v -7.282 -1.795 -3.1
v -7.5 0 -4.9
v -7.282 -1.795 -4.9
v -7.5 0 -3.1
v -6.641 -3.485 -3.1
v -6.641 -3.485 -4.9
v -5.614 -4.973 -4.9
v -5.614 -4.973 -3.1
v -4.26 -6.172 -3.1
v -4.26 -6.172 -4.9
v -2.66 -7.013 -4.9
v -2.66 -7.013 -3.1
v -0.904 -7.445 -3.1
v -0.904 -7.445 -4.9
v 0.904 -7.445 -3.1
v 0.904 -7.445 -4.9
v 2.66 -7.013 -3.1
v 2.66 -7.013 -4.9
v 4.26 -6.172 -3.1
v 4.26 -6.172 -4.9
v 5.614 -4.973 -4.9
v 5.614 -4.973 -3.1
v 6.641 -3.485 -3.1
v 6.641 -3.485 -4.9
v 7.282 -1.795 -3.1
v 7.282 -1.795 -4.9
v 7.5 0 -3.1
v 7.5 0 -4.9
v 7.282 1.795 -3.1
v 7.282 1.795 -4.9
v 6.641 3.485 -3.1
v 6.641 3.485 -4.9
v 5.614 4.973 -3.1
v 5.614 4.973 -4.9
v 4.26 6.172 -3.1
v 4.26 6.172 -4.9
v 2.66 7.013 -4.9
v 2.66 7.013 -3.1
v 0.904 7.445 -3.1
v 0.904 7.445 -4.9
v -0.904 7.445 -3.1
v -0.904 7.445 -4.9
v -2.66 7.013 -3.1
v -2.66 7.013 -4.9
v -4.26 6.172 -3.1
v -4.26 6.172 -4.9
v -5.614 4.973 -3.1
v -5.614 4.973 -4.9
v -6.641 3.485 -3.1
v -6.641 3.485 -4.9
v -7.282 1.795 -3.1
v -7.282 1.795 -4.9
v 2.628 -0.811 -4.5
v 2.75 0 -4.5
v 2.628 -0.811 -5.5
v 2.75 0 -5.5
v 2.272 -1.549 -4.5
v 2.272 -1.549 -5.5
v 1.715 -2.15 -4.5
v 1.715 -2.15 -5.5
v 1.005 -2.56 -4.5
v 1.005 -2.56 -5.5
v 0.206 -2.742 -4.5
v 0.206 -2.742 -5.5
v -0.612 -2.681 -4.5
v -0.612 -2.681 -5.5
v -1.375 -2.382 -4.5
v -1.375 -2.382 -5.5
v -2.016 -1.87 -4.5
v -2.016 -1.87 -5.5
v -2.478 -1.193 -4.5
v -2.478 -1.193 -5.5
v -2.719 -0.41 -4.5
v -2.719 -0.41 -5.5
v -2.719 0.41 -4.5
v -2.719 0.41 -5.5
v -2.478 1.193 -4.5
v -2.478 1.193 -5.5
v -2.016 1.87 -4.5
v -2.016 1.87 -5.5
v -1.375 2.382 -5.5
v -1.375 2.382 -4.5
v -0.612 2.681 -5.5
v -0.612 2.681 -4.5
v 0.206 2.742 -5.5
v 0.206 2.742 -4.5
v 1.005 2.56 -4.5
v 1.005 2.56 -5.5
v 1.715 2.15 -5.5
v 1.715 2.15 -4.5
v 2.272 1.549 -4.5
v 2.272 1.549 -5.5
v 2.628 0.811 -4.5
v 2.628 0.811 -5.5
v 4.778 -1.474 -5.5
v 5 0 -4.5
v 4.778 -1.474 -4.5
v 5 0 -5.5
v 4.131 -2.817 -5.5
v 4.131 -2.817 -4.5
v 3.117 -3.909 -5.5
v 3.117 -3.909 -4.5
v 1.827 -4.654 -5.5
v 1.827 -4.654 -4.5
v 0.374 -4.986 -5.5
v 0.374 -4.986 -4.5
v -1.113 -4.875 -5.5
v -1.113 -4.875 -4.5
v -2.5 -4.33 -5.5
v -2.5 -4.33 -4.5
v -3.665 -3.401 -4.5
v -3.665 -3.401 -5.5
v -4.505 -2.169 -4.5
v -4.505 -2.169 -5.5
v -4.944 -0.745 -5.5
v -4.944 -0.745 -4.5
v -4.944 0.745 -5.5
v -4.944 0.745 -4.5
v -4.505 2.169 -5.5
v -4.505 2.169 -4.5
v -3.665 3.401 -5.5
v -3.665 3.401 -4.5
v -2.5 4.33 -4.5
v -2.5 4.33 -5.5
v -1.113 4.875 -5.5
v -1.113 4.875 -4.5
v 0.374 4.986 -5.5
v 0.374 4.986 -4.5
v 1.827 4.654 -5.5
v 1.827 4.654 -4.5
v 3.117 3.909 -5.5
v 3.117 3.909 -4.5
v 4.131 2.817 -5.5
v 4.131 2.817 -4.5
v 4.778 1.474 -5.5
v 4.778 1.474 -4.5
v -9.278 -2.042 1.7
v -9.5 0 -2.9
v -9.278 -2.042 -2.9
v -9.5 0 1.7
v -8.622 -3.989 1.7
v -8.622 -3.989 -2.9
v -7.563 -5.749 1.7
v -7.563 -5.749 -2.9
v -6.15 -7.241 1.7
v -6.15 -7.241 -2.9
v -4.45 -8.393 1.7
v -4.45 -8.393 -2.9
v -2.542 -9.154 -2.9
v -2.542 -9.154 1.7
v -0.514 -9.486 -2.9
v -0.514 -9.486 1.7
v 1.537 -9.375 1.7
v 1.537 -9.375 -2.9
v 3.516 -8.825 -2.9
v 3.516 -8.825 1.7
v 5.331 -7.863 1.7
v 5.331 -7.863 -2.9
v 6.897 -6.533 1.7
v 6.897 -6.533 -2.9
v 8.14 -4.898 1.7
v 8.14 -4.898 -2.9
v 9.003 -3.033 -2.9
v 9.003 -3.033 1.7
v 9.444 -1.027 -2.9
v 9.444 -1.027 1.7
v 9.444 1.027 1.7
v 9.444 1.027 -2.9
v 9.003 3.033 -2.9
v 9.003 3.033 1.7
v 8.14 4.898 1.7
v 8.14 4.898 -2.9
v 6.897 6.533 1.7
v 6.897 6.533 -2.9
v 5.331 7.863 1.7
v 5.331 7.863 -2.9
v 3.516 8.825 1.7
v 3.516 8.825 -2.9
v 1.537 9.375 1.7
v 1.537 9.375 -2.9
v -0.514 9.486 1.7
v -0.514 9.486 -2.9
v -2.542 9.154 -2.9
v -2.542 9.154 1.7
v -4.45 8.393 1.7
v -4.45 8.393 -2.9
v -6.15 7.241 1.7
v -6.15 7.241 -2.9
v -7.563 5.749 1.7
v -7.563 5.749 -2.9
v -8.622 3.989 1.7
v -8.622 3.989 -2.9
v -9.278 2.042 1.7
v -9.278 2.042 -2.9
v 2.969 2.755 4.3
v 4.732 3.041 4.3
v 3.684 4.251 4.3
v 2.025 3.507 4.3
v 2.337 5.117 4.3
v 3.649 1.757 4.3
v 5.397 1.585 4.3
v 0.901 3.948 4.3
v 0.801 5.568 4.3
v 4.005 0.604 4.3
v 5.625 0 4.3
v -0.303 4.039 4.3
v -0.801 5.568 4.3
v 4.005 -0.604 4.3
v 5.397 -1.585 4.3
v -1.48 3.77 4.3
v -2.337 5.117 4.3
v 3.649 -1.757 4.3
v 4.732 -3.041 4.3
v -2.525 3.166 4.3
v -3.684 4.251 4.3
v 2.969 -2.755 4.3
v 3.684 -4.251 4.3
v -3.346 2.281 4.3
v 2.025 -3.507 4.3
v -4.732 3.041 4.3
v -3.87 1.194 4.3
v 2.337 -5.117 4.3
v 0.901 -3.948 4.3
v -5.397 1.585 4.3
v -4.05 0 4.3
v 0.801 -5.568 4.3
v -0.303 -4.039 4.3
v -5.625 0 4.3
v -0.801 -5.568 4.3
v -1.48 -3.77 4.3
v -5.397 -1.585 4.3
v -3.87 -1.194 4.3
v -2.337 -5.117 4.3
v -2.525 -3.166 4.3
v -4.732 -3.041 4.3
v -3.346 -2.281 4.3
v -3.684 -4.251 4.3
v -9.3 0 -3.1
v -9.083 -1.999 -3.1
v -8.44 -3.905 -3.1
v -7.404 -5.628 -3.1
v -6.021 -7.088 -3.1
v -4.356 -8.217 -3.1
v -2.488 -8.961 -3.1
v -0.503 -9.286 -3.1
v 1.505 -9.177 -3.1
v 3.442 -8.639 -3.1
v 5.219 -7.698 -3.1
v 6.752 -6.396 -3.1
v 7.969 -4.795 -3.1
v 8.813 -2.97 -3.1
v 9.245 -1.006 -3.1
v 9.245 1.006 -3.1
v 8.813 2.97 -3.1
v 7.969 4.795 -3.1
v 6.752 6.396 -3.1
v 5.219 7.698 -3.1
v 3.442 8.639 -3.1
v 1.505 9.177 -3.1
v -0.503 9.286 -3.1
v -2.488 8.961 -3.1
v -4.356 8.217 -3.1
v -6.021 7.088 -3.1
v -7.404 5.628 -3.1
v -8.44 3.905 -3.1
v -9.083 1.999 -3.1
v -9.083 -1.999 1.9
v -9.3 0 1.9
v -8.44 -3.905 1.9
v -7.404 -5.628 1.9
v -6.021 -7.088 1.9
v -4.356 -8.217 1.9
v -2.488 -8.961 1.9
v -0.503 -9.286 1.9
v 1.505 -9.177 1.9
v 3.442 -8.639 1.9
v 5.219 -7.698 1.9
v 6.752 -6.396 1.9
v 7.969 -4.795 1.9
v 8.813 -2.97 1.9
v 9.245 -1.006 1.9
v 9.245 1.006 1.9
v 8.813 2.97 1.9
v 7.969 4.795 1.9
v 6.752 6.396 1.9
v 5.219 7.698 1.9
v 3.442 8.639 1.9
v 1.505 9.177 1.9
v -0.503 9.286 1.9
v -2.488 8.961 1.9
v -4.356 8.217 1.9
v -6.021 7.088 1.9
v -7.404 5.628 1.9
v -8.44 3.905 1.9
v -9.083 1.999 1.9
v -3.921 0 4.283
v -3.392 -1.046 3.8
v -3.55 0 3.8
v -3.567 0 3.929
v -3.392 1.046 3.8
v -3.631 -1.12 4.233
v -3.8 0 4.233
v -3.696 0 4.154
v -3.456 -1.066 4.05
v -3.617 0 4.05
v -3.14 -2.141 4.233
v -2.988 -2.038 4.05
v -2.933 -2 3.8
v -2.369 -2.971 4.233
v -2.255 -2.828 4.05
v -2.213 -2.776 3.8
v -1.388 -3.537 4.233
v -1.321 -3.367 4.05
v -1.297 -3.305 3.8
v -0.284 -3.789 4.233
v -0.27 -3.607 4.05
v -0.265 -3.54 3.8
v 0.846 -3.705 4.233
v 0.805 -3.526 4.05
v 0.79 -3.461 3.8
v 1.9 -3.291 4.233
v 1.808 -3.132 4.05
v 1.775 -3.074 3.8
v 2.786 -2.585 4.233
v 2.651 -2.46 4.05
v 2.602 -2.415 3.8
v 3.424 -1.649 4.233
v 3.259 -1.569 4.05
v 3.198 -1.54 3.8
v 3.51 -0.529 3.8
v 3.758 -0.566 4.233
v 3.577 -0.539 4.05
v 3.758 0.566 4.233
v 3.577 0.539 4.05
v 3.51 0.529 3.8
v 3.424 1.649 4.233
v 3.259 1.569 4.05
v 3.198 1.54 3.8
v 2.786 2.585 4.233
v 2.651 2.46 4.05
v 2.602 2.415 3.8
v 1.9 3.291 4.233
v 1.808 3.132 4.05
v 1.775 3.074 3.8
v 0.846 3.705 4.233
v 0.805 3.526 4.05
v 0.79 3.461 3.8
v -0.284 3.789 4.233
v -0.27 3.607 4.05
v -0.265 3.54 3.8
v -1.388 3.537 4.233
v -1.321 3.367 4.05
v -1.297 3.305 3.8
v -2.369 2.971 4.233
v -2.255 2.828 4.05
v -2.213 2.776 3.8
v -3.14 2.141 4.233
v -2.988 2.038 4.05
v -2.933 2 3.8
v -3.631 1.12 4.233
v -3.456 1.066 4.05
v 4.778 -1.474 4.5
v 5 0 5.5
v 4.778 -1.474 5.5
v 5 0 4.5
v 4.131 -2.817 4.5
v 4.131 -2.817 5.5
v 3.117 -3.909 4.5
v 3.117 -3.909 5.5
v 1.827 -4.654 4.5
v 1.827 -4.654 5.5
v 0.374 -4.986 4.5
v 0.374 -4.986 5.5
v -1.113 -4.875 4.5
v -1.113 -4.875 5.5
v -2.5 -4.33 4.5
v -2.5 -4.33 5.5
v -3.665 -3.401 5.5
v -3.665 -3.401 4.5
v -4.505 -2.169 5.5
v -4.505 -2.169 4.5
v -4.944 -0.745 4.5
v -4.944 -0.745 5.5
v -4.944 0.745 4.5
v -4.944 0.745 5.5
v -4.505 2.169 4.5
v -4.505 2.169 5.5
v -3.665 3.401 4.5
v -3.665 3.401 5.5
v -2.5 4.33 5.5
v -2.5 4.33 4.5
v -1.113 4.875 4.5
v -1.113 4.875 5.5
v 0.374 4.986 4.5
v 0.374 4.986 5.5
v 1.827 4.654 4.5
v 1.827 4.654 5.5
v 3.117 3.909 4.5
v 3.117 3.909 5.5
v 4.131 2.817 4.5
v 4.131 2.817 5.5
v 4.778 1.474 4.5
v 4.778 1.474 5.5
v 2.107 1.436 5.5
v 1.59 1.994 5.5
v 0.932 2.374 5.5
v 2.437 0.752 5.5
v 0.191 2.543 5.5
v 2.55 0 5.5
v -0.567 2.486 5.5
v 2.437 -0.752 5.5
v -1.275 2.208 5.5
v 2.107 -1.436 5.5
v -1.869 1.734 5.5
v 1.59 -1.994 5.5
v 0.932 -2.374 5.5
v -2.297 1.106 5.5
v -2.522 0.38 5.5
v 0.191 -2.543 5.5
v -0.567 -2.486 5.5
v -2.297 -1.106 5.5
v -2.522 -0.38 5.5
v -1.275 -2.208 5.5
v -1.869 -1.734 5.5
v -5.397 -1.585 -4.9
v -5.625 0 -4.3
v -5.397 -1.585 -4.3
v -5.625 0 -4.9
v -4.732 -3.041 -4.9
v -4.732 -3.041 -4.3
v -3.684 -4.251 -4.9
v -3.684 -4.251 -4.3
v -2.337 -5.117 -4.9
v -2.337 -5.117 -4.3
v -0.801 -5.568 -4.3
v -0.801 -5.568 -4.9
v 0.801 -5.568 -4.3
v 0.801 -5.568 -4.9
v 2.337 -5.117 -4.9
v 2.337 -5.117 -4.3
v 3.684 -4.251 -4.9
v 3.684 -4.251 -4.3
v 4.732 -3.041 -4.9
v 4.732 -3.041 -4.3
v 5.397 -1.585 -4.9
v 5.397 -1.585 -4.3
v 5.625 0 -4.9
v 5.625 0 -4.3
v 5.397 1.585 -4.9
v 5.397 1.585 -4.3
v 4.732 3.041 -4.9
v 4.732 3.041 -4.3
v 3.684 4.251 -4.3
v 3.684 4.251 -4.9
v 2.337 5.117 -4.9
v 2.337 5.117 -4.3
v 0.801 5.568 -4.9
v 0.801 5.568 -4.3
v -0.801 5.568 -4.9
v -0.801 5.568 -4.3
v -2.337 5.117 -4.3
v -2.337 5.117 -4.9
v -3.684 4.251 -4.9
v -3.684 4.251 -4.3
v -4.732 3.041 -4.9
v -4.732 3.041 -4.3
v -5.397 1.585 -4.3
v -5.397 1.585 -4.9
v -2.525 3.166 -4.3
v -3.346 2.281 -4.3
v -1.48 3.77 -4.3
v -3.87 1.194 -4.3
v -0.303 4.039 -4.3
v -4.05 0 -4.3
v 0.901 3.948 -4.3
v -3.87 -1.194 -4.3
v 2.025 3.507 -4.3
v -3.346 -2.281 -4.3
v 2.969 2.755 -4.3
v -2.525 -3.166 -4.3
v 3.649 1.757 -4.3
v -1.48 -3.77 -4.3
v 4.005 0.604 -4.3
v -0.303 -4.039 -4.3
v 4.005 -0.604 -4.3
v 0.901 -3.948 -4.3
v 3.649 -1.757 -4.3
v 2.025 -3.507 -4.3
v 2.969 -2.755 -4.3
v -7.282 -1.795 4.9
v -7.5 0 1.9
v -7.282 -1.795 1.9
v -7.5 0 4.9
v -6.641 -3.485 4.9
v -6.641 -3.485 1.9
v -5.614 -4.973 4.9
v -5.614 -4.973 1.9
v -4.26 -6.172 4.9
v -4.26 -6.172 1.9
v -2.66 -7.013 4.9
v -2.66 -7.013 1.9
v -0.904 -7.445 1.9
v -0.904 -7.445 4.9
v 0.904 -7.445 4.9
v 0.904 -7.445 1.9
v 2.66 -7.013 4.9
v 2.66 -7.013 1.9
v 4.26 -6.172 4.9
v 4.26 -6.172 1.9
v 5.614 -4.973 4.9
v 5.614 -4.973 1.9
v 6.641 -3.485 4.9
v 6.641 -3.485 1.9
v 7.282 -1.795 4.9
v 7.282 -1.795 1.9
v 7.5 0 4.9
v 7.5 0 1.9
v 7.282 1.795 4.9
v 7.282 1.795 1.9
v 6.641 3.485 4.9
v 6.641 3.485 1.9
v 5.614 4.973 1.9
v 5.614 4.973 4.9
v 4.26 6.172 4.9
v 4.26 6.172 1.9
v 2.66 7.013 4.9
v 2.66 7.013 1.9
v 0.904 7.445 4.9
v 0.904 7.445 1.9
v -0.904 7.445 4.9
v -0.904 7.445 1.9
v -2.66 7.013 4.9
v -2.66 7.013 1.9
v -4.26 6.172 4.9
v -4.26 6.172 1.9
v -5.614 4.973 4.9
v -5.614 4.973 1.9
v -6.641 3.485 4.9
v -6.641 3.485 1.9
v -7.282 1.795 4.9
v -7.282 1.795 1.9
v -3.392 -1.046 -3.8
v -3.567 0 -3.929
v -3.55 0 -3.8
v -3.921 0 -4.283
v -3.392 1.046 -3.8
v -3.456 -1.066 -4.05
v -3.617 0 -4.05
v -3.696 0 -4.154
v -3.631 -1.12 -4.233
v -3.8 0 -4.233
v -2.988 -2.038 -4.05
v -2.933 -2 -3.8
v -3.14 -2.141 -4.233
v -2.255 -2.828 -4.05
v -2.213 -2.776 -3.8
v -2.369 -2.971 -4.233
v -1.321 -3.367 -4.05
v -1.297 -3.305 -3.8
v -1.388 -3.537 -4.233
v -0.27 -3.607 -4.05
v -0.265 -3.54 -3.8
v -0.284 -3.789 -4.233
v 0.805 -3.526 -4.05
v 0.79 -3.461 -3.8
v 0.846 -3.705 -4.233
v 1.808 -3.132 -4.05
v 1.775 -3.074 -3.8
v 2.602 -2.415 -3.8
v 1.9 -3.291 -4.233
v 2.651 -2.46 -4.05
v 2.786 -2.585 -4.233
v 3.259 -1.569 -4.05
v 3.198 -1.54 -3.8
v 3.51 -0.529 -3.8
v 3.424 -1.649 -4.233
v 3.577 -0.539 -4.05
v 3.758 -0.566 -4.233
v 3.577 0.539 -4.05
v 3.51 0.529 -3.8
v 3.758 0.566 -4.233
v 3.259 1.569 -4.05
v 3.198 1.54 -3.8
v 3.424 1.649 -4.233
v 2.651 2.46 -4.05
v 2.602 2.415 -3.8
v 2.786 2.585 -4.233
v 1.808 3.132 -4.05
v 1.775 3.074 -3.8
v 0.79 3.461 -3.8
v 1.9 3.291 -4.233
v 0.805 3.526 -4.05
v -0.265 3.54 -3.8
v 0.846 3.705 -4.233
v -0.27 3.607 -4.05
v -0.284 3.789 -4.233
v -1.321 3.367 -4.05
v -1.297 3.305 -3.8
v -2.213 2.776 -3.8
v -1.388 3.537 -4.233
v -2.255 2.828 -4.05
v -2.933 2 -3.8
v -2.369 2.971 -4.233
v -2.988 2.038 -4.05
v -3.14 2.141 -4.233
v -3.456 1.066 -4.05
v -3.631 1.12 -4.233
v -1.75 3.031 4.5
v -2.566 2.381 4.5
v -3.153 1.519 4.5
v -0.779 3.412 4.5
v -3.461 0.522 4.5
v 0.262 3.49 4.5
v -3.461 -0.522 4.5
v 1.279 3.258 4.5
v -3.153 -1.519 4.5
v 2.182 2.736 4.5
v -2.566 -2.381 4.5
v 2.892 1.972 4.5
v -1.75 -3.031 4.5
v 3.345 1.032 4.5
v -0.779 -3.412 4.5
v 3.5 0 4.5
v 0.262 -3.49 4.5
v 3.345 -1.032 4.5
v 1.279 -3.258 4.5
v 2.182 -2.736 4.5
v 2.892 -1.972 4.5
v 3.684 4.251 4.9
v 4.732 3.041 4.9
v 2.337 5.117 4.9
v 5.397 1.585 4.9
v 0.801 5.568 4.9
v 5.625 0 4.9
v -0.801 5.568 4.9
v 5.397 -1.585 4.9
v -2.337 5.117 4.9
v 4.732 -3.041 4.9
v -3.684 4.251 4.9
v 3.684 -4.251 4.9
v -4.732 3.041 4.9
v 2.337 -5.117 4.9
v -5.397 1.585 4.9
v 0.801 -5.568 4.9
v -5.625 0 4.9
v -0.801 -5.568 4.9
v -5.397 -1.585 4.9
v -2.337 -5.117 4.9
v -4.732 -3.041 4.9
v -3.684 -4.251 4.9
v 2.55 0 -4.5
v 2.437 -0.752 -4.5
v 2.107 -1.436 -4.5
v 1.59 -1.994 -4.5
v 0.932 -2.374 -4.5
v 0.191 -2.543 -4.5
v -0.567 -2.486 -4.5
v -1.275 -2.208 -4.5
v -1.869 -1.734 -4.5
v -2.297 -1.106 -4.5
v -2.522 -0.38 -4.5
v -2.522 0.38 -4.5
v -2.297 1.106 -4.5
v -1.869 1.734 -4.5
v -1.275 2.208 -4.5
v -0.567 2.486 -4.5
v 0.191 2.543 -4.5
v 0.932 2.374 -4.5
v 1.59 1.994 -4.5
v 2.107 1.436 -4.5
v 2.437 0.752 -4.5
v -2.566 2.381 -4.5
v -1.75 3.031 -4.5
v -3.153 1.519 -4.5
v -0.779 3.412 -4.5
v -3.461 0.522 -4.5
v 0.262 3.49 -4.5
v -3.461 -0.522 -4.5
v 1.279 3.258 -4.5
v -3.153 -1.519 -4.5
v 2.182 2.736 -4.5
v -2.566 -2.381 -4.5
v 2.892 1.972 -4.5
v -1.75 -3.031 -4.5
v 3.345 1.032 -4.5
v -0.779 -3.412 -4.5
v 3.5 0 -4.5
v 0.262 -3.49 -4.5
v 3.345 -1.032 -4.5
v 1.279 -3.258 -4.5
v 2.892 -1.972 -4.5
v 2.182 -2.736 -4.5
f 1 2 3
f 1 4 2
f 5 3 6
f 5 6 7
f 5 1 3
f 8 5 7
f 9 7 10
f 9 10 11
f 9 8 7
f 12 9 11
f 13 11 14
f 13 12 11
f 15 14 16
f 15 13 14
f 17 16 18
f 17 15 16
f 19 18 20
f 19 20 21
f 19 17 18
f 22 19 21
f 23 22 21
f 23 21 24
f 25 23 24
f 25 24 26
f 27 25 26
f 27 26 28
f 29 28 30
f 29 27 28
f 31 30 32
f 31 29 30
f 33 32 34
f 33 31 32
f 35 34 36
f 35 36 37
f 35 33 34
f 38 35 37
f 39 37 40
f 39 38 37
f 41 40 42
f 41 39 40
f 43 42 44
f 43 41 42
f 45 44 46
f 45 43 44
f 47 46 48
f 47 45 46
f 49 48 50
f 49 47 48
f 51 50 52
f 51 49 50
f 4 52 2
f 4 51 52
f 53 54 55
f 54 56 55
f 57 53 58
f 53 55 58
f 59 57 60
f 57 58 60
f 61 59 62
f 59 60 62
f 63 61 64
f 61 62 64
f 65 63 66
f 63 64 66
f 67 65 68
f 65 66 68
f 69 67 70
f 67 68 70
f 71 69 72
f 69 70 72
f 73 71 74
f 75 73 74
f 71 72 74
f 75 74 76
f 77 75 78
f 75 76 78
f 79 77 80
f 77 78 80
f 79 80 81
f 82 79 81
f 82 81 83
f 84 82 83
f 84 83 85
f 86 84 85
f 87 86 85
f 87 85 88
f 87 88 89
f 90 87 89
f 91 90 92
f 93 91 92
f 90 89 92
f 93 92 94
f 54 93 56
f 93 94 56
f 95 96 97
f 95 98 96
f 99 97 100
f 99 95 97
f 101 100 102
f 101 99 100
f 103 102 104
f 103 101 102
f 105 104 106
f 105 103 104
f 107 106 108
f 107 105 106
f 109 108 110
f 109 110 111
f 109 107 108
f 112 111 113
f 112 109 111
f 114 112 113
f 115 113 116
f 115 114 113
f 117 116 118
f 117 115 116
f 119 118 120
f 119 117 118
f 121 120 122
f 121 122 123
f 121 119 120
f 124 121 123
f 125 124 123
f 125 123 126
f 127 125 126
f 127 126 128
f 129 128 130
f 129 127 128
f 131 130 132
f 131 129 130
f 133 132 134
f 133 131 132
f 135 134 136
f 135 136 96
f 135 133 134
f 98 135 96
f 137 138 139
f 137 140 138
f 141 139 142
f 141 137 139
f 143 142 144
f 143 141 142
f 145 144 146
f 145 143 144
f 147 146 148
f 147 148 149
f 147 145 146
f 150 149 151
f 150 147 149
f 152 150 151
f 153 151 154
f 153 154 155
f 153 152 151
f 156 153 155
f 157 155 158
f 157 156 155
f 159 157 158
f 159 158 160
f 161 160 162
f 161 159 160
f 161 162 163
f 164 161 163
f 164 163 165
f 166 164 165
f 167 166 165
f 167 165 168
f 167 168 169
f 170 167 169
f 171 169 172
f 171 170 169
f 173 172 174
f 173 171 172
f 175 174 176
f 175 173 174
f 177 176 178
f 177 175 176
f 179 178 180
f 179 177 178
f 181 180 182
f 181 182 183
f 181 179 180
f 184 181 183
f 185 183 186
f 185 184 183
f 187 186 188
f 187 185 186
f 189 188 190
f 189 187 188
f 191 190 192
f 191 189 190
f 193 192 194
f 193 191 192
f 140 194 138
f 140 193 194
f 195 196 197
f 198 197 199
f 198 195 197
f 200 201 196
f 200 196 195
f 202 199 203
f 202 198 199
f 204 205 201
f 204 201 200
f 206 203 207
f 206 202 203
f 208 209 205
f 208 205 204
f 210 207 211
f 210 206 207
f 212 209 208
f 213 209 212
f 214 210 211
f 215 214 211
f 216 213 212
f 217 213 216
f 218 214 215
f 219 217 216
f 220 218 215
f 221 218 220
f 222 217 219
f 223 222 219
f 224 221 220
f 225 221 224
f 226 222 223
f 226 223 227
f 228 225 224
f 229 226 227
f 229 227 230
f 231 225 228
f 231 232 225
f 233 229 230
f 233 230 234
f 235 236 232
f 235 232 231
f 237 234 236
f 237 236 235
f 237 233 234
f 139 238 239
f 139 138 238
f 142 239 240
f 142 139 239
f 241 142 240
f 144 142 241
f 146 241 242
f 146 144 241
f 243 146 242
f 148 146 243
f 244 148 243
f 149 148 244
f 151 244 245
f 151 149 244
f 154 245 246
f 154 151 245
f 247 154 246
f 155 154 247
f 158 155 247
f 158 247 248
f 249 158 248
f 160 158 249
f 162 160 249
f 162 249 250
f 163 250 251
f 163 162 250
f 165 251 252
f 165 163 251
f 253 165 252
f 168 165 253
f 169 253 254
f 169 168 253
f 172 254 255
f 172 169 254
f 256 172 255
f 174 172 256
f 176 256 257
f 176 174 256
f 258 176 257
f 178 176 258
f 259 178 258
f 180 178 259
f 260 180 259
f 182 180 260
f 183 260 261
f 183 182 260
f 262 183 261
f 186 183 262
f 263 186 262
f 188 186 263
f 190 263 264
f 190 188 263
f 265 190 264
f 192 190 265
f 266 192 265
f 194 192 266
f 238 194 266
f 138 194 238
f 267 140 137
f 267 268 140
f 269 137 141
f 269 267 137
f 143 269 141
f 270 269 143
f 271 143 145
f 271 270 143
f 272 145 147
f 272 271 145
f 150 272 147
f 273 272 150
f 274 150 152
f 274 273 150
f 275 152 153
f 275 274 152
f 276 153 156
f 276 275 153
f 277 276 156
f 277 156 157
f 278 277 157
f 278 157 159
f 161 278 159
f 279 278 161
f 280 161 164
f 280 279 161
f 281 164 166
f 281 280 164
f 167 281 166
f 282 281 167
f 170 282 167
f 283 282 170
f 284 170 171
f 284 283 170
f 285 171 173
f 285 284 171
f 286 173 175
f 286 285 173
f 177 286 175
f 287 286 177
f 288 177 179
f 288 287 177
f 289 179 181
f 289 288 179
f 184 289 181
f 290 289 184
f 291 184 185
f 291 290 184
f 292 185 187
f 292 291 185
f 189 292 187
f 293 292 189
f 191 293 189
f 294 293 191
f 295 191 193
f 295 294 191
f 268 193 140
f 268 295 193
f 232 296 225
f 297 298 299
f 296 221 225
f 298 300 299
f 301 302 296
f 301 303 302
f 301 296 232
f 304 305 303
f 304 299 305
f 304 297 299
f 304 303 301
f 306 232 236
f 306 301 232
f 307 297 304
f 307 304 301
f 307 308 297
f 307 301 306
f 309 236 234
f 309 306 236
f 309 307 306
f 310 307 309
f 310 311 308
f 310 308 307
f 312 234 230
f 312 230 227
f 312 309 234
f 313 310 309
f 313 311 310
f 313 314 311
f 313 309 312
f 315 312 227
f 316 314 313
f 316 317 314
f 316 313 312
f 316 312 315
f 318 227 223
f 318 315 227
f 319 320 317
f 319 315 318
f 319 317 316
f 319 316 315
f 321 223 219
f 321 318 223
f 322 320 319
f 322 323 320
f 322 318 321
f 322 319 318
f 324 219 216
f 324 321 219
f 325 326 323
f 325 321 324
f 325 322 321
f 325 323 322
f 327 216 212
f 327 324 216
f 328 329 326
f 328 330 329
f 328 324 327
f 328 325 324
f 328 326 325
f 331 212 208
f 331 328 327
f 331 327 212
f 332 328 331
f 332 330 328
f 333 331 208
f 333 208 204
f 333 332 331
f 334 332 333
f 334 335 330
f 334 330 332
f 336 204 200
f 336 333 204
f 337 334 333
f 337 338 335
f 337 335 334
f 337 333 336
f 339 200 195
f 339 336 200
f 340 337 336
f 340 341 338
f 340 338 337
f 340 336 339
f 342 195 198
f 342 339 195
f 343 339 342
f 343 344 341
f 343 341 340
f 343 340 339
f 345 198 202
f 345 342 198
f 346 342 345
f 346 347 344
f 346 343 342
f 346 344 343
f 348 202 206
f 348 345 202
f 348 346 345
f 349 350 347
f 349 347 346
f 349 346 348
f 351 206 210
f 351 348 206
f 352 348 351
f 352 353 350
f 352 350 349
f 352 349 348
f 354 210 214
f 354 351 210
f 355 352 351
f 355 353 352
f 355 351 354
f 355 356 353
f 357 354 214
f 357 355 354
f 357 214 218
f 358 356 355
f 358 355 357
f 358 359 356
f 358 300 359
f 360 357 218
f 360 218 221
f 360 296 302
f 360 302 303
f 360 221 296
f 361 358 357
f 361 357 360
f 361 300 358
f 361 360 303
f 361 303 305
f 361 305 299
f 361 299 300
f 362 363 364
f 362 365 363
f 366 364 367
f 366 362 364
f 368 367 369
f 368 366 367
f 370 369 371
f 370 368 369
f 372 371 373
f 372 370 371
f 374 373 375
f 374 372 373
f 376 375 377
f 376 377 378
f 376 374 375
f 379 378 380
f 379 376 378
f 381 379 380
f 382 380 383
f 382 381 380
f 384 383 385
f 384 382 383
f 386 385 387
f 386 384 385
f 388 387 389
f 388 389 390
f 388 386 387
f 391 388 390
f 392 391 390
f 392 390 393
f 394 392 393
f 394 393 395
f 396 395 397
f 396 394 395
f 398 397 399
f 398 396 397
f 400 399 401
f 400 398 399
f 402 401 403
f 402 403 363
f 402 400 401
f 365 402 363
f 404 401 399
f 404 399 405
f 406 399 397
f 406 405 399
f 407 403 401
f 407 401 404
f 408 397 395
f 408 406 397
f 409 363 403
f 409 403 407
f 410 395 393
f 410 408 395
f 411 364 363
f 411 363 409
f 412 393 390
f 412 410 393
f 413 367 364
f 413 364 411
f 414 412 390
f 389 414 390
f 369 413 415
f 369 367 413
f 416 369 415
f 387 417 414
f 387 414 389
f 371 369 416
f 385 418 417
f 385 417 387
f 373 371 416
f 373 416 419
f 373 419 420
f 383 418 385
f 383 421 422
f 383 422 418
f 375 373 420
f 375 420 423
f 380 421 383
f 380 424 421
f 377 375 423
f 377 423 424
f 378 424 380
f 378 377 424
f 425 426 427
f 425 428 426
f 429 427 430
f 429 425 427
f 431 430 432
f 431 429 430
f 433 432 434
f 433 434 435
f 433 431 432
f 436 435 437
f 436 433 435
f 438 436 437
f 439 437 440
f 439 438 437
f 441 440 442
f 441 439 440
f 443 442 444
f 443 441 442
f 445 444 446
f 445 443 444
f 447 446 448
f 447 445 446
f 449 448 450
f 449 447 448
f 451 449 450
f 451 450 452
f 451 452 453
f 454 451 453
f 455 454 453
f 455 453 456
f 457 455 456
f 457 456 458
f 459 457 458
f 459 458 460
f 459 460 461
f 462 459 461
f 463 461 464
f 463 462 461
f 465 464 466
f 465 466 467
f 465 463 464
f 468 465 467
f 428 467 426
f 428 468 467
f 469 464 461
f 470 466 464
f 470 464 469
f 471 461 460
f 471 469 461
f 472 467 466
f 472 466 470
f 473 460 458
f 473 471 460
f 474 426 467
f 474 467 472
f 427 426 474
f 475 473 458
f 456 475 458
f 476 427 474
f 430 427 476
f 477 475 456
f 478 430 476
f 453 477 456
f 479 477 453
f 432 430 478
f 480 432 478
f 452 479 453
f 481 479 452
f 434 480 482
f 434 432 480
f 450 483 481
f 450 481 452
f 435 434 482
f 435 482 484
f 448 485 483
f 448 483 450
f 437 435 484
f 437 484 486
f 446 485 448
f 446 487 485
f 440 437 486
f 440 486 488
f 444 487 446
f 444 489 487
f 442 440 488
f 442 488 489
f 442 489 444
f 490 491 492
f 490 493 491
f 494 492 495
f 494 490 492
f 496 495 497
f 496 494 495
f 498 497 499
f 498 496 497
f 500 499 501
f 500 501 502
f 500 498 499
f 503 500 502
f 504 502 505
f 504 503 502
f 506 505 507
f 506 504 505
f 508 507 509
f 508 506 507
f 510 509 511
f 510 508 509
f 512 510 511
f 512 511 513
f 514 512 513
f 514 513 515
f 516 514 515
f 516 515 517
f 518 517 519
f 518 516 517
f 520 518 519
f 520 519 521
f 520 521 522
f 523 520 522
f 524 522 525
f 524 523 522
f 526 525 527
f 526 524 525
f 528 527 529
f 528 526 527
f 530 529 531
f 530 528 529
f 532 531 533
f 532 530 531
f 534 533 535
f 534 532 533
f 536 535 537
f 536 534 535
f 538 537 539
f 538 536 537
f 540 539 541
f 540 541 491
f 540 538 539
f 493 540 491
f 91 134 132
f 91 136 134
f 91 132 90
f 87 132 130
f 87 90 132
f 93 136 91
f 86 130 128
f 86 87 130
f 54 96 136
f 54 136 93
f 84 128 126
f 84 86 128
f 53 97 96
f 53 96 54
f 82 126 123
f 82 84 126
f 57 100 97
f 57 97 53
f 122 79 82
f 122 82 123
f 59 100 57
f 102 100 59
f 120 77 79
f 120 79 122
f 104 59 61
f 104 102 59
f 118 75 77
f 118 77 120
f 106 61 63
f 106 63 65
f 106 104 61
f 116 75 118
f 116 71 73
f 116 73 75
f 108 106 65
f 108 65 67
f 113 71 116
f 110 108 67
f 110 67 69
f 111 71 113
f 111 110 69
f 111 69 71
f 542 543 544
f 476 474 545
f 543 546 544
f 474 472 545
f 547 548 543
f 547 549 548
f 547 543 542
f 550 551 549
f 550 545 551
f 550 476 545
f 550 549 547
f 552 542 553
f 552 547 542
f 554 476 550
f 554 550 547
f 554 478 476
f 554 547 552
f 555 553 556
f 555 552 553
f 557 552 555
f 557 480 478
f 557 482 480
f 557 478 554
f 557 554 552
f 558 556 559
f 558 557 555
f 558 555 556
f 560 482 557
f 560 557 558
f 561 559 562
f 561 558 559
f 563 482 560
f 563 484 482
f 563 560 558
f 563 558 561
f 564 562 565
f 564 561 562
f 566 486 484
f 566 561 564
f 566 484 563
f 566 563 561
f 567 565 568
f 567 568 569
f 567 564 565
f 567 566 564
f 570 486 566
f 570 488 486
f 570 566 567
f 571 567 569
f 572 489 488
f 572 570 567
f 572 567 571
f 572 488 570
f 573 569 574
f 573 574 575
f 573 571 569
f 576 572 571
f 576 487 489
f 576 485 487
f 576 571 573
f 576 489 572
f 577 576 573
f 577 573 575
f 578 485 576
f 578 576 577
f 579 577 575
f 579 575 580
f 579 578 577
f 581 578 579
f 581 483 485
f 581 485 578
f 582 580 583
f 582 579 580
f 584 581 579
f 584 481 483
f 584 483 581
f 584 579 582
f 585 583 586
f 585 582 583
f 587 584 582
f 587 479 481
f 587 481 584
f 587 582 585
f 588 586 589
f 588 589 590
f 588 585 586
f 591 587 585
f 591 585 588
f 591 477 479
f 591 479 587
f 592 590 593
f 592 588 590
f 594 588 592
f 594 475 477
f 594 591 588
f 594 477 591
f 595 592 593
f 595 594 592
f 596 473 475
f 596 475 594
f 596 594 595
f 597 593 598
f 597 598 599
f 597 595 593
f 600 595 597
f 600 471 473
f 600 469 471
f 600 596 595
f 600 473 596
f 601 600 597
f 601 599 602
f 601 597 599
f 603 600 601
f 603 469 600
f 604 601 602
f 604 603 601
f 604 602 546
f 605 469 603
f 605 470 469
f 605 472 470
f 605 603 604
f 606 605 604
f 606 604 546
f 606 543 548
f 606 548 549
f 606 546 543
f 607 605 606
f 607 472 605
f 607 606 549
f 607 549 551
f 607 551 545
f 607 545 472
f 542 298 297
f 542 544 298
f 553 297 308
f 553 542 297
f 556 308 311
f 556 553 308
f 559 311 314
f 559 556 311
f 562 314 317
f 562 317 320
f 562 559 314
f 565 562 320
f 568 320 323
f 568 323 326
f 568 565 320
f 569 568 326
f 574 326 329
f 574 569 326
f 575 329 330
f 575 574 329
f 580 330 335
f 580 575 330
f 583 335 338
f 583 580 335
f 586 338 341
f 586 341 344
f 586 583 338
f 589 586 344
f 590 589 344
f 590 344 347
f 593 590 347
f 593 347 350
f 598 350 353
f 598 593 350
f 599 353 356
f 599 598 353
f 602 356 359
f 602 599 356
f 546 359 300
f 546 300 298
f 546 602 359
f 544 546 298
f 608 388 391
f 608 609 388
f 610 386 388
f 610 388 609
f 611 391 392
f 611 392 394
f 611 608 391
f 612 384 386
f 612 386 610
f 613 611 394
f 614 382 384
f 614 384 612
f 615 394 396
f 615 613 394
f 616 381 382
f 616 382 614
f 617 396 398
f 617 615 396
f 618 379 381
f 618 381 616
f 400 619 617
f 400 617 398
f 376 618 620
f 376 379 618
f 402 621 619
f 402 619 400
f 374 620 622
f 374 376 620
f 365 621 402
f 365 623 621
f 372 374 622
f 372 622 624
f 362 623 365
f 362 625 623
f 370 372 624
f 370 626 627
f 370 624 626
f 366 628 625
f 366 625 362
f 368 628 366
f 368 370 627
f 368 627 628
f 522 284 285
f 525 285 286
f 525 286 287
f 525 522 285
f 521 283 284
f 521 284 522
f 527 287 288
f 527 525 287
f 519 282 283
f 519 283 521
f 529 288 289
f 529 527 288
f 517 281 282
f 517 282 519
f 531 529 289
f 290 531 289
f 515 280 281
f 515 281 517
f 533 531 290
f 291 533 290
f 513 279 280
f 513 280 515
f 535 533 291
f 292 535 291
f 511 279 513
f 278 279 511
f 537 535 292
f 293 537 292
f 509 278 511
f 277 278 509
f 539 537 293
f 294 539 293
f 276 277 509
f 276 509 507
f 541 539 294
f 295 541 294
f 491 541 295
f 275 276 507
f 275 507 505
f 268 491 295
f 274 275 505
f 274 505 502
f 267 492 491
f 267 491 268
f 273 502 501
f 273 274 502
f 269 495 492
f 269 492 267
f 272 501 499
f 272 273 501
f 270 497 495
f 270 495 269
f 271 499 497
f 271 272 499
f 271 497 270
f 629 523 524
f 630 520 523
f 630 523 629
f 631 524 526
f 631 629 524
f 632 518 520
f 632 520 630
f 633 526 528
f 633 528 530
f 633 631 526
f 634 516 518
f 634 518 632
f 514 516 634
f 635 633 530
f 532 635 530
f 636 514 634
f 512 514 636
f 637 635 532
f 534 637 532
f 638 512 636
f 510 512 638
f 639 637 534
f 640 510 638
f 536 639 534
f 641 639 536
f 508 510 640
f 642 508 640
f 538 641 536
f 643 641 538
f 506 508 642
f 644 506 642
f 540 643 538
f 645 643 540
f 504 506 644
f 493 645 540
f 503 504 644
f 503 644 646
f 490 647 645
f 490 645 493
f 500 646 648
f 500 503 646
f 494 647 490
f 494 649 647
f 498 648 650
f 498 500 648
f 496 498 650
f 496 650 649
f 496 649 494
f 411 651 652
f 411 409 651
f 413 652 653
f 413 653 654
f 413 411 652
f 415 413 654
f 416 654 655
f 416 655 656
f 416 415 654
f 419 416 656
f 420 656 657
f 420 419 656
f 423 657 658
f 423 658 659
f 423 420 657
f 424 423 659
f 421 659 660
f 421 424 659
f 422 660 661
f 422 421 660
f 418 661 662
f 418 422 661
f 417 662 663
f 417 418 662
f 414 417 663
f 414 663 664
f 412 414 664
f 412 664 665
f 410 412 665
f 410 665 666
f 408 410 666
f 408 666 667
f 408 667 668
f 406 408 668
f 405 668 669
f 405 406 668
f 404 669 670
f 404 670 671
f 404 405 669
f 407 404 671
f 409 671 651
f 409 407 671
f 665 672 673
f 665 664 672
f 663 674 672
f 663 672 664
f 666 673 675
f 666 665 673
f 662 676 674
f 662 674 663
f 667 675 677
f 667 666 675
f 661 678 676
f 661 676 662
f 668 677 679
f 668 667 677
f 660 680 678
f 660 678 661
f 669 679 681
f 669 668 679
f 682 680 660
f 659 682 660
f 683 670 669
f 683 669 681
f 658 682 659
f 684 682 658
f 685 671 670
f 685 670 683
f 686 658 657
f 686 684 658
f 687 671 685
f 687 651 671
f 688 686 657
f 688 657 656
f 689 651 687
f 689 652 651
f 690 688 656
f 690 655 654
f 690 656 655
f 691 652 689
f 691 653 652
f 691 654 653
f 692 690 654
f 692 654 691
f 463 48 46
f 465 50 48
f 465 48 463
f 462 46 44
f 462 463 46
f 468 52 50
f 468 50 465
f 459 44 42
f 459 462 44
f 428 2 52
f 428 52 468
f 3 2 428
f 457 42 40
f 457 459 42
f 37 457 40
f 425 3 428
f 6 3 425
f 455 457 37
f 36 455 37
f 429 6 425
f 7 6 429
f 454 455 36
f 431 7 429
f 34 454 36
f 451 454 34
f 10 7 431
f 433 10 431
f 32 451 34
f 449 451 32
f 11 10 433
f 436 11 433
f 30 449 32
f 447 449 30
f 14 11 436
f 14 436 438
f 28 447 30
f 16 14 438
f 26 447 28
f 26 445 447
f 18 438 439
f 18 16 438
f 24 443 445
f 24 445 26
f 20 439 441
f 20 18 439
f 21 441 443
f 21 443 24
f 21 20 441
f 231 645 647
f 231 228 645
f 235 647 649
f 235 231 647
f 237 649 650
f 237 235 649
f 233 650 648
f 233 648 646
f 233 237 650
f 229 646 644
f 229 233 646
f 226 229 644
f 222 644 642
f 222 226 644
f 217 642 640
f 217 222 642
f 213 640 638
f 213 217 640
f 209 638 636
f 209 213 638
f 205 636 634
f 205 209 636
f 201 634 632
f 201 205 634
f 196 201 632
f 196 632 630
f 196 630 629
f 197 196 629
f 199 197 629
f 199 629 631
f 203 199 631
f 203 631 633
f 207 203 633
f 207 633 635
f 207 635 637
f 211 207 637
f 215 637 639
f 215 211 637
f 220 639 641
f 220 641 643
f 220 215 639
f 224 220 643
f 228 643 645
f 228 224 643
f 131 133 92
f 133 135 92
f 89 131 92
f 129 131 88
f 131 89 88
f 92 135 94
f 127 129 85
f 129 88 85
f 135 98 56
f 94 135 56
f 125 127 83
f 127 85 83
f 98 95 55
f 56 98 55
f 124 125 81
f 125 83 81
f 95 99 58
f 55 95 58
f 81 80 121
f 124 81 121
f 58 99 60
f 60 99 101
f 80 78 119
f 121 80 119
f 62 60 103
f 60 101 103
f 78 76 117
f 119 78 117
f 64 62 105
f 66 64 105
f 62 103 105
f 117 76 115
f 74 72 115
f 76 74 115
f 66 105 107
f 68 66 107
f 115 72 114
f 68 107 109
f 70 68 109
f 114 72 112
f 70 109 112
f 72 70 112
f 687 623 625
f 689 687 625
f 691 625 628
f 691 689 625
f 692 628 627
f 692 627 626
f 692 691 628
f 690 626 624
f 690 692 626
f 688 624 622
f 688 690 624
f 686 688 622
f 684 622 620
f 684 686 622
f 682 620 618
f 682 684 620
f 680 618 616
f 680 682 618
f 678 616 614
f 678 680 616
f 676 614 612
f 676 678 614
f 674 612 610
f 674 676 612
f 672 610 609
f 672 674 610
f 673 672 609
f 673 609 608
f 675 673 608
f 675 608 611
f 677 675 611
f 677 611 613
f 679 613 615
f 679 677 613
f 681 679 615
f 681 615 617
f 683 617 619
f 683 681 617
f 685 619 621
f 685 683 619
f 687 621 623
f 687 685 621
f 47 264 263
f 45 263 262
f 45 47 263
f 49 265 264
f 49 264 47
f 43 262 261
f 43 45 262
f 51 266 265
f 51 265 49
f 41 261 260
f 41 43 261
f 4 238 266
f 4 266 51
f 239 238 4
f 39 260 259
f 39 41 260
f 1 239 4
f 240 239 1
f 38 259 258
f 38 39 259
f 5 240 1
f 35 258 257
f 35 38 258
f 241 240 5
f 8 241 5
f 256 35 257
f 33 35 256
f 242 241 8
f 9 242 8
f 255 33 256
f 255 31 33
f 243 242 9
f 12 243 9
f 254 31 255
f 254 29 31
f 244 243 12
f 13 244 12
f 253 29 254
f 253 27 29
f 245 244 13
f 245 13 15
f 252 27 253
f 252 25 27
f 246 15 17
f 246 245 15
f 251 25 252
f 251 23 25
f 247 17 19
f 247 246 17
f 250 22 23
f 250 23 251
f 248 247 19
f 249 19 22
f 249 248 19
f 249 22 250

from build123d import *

# Parameters (mm, degrees)
SKETCH3_W = 1
SKETCH3_H = 2.25


with BuildPart() as part:
    # Sketch1 → Revolve1 (revolve)
    with BuildSketch(Plane(origin=(0, 0, 0), x_dir=(0, 0, -1), z_dir=(1, 0, 0)), mode=Mode.PRIVATE) as revolve1_sk:
        with BuildLine():
            Line((-3.8, 3.55), (3.8, 3.55))
            ThreePointArc((3.8, 3.55), (4.153553391, 3.696446609), (4.3, 4.05))
            Line((4.3, 4.05), (4.3, 5.625))
            Line((4.3, 5.625), (4.9, 5.625))
            Line((4.9, 5.625), (4.9, 7.5))
            Line((4.9, 7.5), (3.1, 7.5))
            Line((3.1, 7.5), (3.1, 9.3))
            Line((3.1, 9.3), (2.9, 9.5))
            Line((2.9, 9.5), (-1.7, 9.5))
            Line((-1.7, 9.5), (-1.9, 9.3))
            Line((-1.9, 9.3), (-1.9, 7.5))
            Line((-1.9, 7.5), (-4.9, 7.5))
            Line((-4.9, 7.5), (-4.9, 5.625))
            Line((-4.9, 5.625), (-4.3, 5.625))
            Line((-4.3, 5.625), (-4.3, 4.05))
            ThreePointArc((-4.3, 4.05), (-4.153553391, 3.696446609), (-3.8, 3.55))
        make_face()
    revolve(revolve1_sk.sketch.rotate(Axis((0, 0, -4.9), (0, 0, 1)), 90), axis=Axis((0, 0, -4.9), (0, 0, 1)))


with BuildPart() as body_2:
    # Sketch2 → Revolve2 (revolve)
    with BuildSketch(Plane(origin=(0, 0, 0), x_dir=(0, 0, -1), z_dir=(1, 0, 0)), mode=Mode.PRIVATE) as revolve2_sk:
        Polygon((-5.5, 5), (-4.5, 5), (-4.5, 3.5), (4.5, 3.5), (4.5, 2.55), (-5.5, 2.55), align=None)
    revolve(revolve2_sk.sketch.rotate(Axis((0, 0, 4.9), (0, 0, -1)), 90), axis=Axis((0, 0, 4.9), (0, 0, -1)))


with BuildPart() as body_3:
    # Sketch3 → Revolve3 (revolve)
    with BuildSketch(Plane(origin=(0, 0, 0), x_dir=(0, 0, -1), z_dir=(1, 0, 0)), mode=Mode.PRIVATE) as revolve3_sk:
        with Locations((5, 3.875)):
            Rectangle(SKETCH3_W, SKETCH3_H)
    revolve(revolve3_sk.sketch.rotate(Axis((0, 0, 4.9), (0, 0, -1)), 90), axis=Axis((0, 0, 4.9), (0, 0, -1)))


solid = Compound([part.part, body_2.part, body_3.part])
